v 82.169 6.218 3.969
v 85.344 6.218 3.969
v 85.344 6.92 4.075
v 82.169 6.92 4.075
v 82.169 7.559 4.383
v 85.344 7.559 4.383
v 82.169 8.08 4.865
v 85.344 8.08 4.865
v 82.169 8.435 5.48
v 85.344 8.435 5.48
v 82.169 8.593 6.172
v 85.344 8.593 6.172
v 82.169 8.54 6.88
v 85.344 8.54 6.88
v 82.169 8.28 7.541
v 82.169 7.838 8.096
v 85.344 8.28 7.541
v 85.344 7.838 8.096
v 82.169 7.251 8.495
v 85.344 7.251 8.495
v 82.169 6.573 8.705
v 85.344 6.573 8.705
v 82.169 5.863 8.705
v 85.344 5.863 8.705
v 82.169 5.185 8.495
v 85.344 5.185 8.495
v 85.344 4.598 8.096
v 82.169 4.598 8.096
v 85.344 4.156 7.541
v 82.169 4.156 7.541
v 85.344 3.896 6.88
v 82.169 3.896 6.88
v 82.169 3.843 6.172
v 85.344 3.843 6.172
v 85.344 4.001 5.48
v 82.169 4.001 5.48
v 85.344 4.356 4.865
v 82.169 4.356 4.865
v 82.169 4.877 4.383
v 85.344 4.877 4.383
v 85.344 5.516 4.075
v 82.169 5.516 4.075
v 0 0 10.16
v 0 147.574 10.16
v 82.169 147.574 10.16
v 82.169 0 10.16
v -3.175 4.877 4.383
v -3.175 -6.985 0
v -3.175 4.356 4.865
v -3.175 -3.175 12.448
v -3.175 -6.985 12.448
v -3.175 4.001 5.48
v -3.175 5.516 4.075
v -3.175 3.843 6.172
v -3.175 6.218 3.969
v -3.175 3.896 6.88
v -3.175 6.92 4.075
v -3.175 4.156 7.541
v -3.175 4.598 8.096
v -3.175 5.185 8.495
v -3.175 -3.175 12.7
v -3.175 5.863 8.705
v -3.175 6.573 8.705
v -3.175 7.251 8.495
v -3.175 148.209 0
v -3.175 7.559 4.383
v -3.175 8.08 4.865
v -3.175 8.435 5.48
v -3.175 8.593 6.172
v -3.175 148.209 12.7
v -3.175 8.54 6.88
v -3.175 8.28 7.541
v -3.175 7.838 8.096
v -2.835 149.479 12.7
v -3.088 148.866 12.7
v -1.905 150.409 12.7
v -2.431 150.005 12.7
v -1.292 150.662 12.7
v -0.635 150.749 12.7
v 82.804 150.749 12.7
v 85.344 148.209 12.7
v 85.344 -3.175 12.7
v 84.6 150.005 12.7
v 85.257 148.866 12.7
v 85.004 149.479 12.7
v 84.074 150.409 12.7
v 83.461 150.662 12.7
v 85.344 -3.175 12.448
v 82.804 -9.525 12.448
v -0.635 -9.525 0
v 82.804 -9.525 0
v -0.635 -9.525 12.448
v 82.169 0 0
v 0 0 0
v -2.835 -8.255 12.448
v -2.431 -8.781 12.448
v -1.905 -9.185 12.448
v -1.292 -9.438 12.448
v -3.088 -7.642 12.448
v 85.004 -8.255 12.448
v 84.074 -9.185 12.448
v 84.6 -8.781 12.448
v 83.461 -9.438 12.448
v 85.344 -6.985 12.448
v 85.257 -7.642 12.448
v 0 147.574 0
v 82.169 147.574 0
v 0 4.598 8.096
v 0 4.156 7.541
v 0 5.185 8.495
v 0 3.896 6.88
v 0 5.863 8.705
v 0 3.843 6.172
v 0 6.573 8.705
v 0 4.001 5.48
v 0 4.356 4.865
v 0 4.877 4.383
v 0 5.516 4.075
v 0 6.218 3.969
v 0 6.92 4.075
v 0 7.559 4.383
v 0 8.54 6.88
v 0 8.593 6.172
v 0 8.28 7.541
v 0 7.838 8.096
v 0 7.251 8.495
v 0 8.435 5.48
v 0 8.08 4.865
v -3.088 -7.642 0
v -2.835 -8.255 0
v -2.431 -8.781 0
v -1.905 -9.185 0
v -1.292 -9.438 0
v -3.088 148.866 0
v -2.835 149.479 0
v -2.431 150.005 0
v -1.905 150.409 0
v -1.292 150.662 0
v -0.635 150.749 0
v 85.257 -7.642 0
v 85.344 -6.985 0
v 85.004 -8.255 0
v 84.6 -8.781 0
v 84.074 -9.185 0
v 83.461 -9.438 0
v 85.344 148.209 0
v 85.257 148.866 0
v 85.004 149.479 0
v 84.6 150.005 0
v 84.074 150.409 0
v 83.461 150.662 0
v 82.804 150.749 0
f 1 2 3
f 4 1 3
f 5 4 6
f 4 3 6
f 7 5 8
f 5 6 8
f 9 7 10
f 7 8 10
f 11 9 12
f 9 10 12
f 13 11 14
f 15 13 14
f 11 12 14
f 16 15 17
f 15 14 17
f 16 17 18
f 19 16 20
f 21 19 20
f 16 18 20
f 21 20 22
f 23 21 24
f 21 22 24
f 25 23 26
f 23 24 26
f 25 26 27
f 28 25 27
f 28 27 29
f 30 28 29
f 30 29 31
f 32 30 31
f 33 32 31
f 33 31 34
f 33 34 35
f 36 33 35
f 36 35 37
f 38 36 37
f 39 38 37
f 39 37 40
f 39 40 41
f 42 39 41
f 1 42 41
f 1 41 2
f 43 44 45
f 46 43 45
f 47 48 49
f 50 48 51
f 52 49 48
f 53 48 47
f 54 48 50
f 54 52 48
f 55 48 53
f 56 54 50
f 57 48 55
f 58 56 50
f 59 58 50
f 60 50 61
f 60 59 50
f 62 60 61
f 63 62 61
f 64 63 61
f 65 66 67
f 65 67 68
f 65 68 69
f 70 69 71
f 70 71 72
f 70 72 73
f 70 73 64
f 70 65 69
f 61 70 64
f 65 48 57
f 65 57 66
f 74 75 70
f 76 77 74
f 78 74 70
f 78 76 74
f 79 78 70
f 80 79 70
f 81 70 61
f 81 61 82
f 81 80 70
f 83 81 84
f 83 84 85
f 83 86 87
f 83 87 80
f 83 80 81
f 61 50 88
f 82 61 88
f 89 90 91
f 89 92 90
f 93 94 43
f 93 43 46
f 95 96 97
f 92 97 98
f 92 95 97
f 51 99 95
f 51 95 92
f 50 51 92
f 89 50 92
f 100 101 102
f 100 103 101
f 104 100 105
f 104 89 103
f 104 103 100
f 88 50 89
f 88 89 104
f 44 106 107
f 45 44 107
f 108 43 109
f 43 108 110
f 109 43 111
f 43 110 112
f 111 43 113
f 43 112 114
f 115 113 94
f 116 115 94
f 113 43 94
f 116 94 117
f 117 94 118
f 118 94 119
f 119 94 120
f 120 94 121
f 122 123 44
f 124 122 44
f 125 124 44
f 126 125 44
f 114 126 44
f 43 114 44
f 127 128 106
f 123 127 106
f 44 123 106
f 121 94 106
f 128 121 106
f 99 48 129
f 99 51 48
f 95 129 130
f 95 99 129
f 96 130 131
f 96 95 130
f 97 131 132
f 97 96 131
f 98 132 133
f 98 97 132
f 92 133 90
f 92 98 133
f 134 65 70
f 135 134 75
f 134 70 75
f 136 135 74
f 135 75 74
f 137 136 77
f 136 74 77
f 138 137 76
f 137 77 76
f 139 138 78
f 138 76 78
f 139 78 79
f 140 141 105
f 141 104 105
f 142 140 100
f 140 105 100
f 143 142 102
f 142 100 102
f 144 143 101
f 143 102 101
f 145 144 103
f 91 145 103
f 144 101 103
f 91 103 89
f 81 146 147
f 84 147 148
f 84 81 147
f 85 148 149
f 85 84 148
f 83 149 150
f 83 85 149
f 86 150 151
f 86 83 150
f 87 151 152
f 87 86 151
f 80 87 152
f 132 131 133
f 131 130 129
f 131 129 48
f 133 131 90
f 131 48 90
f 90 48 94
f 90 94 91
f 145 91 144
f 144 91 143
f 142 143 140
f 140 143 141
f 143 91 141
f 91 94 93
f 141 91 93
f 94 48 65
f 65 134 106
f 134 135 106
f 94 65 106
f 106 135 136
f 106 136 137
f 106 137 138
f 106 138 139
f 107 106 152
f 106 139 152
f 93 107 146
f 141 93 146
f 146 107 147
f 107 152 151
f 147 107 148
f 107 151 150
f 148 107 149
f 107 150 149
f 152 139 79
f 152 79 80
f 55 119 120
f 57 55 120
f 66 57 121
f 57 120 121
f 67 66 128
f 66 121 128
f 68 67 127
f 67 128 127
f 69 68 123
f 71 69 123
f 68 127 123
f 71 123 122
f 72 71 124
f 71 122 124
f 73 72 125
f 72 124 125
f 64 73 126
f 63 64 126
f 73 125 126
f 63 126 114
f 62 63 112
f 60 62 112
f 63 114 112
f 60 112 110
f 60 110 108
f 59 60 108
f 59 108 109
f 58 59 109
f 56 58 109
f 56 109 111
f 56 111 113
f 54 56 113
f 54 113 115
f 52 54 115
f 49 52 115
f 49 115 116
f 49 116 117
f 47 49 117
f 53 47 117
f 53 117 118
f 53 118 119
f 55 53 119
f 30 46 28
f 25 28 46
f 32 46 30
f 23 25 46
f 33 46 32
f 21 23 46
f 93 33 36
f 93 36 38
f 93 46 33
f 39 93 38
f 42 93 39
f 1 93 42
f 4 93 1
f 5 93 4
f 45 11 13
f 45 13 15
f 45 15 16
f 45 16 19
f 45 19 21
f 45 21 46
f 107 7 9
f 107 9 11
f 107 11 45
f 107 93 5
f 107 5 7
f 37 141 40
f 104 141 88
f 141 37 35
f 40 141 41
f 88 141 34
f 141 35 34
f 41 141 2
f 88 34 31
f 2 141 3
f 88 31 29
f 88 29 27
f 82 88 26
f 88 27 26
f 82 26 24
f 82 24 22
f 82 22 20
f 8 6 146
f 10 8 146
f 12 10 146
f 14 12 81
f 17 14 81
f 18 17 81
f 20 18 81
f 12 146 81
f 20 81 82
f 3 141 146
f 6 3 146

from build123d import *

# Parameters (mm, degrees)
SKETCH2_W           = 88.519
SKETCH2_H           = 153.924
BOSS_EXTRUDE2_DEPTH = 12.7
SKETCH2_6_W         = 82.169
SKETCH2_6_H         = 147.574
CUT_EXTRUDE1_DEPTH  = 10.16
SKETCH3_R           = 2.38125
CUT_EXTRUDE2_DEPTH  = 129.54
SKETCH4_W           = 88.519
SKETCH4_H           = 12.447800228
BOSS_EXTRUDE3_DEPTH = 6.35
FILLET1_R           = 2.54


with BuildPart() as part:
    # Sketch2 → Boss-Extrude2 (new body)
    with BuildSketch(Plane.XY):
        with Locations((41.0845, 73.787)):
            Rectangle(SKETCH2_W, SKETCH2_H)
    extrude(amount=BOSS_EXTRUDE2_DEPTH)

    # Sketch2<6> → Cut-Extrude1 (cut)
    with BuildSketch(Plane.XY):
        with Locations((41.0845, 73.787)):
            Rectangle(SKETCH2_6_W, SKETCH2_6_H)
    extrude(amount=CUT_EXTRUDE1_DEPTH, mode=Mode.SUBTRACT)

    # Sketch3 → Cut-Extrude2 (cut)
    with BuildSketch(Plane(origin=(85.344, 0, 0), x_dir=(0, 0, -1), z_dir=(1, 0, 0))):
        with Locations((-6.35, 6.217998886)):
            Circle(SKETCH3_R)
    extrude(amount=-CUT_EXTRUDE2_DEPTH, mode=Mode.SUBTRACT)

    # Sketch4 → Boss-Extrude3 (add)
    with BuildSketch(Plane.XZ.offset(3.175)):
        with Locations((41.0845, 6.223900114)):
            Rectangle(SKETCH4_W, SKETCH4_H)
    extrude(amount=BOSS_EXTRUDE3_DEPTH)

    # Fillet1
    fillet1_edges = [part.edges().sort_by_distance(p)[0] for p in [
        (-3.175, -9.525, 6.223900114),
        (85.344, -9.525, 6.223900114),
        (-3.175, 150.749, 6.35),
        (85.344, 150.749, 6.35),
    ]]
    fillet(fillet1_edges, radius=FILLET1_R)


solid = part.part
